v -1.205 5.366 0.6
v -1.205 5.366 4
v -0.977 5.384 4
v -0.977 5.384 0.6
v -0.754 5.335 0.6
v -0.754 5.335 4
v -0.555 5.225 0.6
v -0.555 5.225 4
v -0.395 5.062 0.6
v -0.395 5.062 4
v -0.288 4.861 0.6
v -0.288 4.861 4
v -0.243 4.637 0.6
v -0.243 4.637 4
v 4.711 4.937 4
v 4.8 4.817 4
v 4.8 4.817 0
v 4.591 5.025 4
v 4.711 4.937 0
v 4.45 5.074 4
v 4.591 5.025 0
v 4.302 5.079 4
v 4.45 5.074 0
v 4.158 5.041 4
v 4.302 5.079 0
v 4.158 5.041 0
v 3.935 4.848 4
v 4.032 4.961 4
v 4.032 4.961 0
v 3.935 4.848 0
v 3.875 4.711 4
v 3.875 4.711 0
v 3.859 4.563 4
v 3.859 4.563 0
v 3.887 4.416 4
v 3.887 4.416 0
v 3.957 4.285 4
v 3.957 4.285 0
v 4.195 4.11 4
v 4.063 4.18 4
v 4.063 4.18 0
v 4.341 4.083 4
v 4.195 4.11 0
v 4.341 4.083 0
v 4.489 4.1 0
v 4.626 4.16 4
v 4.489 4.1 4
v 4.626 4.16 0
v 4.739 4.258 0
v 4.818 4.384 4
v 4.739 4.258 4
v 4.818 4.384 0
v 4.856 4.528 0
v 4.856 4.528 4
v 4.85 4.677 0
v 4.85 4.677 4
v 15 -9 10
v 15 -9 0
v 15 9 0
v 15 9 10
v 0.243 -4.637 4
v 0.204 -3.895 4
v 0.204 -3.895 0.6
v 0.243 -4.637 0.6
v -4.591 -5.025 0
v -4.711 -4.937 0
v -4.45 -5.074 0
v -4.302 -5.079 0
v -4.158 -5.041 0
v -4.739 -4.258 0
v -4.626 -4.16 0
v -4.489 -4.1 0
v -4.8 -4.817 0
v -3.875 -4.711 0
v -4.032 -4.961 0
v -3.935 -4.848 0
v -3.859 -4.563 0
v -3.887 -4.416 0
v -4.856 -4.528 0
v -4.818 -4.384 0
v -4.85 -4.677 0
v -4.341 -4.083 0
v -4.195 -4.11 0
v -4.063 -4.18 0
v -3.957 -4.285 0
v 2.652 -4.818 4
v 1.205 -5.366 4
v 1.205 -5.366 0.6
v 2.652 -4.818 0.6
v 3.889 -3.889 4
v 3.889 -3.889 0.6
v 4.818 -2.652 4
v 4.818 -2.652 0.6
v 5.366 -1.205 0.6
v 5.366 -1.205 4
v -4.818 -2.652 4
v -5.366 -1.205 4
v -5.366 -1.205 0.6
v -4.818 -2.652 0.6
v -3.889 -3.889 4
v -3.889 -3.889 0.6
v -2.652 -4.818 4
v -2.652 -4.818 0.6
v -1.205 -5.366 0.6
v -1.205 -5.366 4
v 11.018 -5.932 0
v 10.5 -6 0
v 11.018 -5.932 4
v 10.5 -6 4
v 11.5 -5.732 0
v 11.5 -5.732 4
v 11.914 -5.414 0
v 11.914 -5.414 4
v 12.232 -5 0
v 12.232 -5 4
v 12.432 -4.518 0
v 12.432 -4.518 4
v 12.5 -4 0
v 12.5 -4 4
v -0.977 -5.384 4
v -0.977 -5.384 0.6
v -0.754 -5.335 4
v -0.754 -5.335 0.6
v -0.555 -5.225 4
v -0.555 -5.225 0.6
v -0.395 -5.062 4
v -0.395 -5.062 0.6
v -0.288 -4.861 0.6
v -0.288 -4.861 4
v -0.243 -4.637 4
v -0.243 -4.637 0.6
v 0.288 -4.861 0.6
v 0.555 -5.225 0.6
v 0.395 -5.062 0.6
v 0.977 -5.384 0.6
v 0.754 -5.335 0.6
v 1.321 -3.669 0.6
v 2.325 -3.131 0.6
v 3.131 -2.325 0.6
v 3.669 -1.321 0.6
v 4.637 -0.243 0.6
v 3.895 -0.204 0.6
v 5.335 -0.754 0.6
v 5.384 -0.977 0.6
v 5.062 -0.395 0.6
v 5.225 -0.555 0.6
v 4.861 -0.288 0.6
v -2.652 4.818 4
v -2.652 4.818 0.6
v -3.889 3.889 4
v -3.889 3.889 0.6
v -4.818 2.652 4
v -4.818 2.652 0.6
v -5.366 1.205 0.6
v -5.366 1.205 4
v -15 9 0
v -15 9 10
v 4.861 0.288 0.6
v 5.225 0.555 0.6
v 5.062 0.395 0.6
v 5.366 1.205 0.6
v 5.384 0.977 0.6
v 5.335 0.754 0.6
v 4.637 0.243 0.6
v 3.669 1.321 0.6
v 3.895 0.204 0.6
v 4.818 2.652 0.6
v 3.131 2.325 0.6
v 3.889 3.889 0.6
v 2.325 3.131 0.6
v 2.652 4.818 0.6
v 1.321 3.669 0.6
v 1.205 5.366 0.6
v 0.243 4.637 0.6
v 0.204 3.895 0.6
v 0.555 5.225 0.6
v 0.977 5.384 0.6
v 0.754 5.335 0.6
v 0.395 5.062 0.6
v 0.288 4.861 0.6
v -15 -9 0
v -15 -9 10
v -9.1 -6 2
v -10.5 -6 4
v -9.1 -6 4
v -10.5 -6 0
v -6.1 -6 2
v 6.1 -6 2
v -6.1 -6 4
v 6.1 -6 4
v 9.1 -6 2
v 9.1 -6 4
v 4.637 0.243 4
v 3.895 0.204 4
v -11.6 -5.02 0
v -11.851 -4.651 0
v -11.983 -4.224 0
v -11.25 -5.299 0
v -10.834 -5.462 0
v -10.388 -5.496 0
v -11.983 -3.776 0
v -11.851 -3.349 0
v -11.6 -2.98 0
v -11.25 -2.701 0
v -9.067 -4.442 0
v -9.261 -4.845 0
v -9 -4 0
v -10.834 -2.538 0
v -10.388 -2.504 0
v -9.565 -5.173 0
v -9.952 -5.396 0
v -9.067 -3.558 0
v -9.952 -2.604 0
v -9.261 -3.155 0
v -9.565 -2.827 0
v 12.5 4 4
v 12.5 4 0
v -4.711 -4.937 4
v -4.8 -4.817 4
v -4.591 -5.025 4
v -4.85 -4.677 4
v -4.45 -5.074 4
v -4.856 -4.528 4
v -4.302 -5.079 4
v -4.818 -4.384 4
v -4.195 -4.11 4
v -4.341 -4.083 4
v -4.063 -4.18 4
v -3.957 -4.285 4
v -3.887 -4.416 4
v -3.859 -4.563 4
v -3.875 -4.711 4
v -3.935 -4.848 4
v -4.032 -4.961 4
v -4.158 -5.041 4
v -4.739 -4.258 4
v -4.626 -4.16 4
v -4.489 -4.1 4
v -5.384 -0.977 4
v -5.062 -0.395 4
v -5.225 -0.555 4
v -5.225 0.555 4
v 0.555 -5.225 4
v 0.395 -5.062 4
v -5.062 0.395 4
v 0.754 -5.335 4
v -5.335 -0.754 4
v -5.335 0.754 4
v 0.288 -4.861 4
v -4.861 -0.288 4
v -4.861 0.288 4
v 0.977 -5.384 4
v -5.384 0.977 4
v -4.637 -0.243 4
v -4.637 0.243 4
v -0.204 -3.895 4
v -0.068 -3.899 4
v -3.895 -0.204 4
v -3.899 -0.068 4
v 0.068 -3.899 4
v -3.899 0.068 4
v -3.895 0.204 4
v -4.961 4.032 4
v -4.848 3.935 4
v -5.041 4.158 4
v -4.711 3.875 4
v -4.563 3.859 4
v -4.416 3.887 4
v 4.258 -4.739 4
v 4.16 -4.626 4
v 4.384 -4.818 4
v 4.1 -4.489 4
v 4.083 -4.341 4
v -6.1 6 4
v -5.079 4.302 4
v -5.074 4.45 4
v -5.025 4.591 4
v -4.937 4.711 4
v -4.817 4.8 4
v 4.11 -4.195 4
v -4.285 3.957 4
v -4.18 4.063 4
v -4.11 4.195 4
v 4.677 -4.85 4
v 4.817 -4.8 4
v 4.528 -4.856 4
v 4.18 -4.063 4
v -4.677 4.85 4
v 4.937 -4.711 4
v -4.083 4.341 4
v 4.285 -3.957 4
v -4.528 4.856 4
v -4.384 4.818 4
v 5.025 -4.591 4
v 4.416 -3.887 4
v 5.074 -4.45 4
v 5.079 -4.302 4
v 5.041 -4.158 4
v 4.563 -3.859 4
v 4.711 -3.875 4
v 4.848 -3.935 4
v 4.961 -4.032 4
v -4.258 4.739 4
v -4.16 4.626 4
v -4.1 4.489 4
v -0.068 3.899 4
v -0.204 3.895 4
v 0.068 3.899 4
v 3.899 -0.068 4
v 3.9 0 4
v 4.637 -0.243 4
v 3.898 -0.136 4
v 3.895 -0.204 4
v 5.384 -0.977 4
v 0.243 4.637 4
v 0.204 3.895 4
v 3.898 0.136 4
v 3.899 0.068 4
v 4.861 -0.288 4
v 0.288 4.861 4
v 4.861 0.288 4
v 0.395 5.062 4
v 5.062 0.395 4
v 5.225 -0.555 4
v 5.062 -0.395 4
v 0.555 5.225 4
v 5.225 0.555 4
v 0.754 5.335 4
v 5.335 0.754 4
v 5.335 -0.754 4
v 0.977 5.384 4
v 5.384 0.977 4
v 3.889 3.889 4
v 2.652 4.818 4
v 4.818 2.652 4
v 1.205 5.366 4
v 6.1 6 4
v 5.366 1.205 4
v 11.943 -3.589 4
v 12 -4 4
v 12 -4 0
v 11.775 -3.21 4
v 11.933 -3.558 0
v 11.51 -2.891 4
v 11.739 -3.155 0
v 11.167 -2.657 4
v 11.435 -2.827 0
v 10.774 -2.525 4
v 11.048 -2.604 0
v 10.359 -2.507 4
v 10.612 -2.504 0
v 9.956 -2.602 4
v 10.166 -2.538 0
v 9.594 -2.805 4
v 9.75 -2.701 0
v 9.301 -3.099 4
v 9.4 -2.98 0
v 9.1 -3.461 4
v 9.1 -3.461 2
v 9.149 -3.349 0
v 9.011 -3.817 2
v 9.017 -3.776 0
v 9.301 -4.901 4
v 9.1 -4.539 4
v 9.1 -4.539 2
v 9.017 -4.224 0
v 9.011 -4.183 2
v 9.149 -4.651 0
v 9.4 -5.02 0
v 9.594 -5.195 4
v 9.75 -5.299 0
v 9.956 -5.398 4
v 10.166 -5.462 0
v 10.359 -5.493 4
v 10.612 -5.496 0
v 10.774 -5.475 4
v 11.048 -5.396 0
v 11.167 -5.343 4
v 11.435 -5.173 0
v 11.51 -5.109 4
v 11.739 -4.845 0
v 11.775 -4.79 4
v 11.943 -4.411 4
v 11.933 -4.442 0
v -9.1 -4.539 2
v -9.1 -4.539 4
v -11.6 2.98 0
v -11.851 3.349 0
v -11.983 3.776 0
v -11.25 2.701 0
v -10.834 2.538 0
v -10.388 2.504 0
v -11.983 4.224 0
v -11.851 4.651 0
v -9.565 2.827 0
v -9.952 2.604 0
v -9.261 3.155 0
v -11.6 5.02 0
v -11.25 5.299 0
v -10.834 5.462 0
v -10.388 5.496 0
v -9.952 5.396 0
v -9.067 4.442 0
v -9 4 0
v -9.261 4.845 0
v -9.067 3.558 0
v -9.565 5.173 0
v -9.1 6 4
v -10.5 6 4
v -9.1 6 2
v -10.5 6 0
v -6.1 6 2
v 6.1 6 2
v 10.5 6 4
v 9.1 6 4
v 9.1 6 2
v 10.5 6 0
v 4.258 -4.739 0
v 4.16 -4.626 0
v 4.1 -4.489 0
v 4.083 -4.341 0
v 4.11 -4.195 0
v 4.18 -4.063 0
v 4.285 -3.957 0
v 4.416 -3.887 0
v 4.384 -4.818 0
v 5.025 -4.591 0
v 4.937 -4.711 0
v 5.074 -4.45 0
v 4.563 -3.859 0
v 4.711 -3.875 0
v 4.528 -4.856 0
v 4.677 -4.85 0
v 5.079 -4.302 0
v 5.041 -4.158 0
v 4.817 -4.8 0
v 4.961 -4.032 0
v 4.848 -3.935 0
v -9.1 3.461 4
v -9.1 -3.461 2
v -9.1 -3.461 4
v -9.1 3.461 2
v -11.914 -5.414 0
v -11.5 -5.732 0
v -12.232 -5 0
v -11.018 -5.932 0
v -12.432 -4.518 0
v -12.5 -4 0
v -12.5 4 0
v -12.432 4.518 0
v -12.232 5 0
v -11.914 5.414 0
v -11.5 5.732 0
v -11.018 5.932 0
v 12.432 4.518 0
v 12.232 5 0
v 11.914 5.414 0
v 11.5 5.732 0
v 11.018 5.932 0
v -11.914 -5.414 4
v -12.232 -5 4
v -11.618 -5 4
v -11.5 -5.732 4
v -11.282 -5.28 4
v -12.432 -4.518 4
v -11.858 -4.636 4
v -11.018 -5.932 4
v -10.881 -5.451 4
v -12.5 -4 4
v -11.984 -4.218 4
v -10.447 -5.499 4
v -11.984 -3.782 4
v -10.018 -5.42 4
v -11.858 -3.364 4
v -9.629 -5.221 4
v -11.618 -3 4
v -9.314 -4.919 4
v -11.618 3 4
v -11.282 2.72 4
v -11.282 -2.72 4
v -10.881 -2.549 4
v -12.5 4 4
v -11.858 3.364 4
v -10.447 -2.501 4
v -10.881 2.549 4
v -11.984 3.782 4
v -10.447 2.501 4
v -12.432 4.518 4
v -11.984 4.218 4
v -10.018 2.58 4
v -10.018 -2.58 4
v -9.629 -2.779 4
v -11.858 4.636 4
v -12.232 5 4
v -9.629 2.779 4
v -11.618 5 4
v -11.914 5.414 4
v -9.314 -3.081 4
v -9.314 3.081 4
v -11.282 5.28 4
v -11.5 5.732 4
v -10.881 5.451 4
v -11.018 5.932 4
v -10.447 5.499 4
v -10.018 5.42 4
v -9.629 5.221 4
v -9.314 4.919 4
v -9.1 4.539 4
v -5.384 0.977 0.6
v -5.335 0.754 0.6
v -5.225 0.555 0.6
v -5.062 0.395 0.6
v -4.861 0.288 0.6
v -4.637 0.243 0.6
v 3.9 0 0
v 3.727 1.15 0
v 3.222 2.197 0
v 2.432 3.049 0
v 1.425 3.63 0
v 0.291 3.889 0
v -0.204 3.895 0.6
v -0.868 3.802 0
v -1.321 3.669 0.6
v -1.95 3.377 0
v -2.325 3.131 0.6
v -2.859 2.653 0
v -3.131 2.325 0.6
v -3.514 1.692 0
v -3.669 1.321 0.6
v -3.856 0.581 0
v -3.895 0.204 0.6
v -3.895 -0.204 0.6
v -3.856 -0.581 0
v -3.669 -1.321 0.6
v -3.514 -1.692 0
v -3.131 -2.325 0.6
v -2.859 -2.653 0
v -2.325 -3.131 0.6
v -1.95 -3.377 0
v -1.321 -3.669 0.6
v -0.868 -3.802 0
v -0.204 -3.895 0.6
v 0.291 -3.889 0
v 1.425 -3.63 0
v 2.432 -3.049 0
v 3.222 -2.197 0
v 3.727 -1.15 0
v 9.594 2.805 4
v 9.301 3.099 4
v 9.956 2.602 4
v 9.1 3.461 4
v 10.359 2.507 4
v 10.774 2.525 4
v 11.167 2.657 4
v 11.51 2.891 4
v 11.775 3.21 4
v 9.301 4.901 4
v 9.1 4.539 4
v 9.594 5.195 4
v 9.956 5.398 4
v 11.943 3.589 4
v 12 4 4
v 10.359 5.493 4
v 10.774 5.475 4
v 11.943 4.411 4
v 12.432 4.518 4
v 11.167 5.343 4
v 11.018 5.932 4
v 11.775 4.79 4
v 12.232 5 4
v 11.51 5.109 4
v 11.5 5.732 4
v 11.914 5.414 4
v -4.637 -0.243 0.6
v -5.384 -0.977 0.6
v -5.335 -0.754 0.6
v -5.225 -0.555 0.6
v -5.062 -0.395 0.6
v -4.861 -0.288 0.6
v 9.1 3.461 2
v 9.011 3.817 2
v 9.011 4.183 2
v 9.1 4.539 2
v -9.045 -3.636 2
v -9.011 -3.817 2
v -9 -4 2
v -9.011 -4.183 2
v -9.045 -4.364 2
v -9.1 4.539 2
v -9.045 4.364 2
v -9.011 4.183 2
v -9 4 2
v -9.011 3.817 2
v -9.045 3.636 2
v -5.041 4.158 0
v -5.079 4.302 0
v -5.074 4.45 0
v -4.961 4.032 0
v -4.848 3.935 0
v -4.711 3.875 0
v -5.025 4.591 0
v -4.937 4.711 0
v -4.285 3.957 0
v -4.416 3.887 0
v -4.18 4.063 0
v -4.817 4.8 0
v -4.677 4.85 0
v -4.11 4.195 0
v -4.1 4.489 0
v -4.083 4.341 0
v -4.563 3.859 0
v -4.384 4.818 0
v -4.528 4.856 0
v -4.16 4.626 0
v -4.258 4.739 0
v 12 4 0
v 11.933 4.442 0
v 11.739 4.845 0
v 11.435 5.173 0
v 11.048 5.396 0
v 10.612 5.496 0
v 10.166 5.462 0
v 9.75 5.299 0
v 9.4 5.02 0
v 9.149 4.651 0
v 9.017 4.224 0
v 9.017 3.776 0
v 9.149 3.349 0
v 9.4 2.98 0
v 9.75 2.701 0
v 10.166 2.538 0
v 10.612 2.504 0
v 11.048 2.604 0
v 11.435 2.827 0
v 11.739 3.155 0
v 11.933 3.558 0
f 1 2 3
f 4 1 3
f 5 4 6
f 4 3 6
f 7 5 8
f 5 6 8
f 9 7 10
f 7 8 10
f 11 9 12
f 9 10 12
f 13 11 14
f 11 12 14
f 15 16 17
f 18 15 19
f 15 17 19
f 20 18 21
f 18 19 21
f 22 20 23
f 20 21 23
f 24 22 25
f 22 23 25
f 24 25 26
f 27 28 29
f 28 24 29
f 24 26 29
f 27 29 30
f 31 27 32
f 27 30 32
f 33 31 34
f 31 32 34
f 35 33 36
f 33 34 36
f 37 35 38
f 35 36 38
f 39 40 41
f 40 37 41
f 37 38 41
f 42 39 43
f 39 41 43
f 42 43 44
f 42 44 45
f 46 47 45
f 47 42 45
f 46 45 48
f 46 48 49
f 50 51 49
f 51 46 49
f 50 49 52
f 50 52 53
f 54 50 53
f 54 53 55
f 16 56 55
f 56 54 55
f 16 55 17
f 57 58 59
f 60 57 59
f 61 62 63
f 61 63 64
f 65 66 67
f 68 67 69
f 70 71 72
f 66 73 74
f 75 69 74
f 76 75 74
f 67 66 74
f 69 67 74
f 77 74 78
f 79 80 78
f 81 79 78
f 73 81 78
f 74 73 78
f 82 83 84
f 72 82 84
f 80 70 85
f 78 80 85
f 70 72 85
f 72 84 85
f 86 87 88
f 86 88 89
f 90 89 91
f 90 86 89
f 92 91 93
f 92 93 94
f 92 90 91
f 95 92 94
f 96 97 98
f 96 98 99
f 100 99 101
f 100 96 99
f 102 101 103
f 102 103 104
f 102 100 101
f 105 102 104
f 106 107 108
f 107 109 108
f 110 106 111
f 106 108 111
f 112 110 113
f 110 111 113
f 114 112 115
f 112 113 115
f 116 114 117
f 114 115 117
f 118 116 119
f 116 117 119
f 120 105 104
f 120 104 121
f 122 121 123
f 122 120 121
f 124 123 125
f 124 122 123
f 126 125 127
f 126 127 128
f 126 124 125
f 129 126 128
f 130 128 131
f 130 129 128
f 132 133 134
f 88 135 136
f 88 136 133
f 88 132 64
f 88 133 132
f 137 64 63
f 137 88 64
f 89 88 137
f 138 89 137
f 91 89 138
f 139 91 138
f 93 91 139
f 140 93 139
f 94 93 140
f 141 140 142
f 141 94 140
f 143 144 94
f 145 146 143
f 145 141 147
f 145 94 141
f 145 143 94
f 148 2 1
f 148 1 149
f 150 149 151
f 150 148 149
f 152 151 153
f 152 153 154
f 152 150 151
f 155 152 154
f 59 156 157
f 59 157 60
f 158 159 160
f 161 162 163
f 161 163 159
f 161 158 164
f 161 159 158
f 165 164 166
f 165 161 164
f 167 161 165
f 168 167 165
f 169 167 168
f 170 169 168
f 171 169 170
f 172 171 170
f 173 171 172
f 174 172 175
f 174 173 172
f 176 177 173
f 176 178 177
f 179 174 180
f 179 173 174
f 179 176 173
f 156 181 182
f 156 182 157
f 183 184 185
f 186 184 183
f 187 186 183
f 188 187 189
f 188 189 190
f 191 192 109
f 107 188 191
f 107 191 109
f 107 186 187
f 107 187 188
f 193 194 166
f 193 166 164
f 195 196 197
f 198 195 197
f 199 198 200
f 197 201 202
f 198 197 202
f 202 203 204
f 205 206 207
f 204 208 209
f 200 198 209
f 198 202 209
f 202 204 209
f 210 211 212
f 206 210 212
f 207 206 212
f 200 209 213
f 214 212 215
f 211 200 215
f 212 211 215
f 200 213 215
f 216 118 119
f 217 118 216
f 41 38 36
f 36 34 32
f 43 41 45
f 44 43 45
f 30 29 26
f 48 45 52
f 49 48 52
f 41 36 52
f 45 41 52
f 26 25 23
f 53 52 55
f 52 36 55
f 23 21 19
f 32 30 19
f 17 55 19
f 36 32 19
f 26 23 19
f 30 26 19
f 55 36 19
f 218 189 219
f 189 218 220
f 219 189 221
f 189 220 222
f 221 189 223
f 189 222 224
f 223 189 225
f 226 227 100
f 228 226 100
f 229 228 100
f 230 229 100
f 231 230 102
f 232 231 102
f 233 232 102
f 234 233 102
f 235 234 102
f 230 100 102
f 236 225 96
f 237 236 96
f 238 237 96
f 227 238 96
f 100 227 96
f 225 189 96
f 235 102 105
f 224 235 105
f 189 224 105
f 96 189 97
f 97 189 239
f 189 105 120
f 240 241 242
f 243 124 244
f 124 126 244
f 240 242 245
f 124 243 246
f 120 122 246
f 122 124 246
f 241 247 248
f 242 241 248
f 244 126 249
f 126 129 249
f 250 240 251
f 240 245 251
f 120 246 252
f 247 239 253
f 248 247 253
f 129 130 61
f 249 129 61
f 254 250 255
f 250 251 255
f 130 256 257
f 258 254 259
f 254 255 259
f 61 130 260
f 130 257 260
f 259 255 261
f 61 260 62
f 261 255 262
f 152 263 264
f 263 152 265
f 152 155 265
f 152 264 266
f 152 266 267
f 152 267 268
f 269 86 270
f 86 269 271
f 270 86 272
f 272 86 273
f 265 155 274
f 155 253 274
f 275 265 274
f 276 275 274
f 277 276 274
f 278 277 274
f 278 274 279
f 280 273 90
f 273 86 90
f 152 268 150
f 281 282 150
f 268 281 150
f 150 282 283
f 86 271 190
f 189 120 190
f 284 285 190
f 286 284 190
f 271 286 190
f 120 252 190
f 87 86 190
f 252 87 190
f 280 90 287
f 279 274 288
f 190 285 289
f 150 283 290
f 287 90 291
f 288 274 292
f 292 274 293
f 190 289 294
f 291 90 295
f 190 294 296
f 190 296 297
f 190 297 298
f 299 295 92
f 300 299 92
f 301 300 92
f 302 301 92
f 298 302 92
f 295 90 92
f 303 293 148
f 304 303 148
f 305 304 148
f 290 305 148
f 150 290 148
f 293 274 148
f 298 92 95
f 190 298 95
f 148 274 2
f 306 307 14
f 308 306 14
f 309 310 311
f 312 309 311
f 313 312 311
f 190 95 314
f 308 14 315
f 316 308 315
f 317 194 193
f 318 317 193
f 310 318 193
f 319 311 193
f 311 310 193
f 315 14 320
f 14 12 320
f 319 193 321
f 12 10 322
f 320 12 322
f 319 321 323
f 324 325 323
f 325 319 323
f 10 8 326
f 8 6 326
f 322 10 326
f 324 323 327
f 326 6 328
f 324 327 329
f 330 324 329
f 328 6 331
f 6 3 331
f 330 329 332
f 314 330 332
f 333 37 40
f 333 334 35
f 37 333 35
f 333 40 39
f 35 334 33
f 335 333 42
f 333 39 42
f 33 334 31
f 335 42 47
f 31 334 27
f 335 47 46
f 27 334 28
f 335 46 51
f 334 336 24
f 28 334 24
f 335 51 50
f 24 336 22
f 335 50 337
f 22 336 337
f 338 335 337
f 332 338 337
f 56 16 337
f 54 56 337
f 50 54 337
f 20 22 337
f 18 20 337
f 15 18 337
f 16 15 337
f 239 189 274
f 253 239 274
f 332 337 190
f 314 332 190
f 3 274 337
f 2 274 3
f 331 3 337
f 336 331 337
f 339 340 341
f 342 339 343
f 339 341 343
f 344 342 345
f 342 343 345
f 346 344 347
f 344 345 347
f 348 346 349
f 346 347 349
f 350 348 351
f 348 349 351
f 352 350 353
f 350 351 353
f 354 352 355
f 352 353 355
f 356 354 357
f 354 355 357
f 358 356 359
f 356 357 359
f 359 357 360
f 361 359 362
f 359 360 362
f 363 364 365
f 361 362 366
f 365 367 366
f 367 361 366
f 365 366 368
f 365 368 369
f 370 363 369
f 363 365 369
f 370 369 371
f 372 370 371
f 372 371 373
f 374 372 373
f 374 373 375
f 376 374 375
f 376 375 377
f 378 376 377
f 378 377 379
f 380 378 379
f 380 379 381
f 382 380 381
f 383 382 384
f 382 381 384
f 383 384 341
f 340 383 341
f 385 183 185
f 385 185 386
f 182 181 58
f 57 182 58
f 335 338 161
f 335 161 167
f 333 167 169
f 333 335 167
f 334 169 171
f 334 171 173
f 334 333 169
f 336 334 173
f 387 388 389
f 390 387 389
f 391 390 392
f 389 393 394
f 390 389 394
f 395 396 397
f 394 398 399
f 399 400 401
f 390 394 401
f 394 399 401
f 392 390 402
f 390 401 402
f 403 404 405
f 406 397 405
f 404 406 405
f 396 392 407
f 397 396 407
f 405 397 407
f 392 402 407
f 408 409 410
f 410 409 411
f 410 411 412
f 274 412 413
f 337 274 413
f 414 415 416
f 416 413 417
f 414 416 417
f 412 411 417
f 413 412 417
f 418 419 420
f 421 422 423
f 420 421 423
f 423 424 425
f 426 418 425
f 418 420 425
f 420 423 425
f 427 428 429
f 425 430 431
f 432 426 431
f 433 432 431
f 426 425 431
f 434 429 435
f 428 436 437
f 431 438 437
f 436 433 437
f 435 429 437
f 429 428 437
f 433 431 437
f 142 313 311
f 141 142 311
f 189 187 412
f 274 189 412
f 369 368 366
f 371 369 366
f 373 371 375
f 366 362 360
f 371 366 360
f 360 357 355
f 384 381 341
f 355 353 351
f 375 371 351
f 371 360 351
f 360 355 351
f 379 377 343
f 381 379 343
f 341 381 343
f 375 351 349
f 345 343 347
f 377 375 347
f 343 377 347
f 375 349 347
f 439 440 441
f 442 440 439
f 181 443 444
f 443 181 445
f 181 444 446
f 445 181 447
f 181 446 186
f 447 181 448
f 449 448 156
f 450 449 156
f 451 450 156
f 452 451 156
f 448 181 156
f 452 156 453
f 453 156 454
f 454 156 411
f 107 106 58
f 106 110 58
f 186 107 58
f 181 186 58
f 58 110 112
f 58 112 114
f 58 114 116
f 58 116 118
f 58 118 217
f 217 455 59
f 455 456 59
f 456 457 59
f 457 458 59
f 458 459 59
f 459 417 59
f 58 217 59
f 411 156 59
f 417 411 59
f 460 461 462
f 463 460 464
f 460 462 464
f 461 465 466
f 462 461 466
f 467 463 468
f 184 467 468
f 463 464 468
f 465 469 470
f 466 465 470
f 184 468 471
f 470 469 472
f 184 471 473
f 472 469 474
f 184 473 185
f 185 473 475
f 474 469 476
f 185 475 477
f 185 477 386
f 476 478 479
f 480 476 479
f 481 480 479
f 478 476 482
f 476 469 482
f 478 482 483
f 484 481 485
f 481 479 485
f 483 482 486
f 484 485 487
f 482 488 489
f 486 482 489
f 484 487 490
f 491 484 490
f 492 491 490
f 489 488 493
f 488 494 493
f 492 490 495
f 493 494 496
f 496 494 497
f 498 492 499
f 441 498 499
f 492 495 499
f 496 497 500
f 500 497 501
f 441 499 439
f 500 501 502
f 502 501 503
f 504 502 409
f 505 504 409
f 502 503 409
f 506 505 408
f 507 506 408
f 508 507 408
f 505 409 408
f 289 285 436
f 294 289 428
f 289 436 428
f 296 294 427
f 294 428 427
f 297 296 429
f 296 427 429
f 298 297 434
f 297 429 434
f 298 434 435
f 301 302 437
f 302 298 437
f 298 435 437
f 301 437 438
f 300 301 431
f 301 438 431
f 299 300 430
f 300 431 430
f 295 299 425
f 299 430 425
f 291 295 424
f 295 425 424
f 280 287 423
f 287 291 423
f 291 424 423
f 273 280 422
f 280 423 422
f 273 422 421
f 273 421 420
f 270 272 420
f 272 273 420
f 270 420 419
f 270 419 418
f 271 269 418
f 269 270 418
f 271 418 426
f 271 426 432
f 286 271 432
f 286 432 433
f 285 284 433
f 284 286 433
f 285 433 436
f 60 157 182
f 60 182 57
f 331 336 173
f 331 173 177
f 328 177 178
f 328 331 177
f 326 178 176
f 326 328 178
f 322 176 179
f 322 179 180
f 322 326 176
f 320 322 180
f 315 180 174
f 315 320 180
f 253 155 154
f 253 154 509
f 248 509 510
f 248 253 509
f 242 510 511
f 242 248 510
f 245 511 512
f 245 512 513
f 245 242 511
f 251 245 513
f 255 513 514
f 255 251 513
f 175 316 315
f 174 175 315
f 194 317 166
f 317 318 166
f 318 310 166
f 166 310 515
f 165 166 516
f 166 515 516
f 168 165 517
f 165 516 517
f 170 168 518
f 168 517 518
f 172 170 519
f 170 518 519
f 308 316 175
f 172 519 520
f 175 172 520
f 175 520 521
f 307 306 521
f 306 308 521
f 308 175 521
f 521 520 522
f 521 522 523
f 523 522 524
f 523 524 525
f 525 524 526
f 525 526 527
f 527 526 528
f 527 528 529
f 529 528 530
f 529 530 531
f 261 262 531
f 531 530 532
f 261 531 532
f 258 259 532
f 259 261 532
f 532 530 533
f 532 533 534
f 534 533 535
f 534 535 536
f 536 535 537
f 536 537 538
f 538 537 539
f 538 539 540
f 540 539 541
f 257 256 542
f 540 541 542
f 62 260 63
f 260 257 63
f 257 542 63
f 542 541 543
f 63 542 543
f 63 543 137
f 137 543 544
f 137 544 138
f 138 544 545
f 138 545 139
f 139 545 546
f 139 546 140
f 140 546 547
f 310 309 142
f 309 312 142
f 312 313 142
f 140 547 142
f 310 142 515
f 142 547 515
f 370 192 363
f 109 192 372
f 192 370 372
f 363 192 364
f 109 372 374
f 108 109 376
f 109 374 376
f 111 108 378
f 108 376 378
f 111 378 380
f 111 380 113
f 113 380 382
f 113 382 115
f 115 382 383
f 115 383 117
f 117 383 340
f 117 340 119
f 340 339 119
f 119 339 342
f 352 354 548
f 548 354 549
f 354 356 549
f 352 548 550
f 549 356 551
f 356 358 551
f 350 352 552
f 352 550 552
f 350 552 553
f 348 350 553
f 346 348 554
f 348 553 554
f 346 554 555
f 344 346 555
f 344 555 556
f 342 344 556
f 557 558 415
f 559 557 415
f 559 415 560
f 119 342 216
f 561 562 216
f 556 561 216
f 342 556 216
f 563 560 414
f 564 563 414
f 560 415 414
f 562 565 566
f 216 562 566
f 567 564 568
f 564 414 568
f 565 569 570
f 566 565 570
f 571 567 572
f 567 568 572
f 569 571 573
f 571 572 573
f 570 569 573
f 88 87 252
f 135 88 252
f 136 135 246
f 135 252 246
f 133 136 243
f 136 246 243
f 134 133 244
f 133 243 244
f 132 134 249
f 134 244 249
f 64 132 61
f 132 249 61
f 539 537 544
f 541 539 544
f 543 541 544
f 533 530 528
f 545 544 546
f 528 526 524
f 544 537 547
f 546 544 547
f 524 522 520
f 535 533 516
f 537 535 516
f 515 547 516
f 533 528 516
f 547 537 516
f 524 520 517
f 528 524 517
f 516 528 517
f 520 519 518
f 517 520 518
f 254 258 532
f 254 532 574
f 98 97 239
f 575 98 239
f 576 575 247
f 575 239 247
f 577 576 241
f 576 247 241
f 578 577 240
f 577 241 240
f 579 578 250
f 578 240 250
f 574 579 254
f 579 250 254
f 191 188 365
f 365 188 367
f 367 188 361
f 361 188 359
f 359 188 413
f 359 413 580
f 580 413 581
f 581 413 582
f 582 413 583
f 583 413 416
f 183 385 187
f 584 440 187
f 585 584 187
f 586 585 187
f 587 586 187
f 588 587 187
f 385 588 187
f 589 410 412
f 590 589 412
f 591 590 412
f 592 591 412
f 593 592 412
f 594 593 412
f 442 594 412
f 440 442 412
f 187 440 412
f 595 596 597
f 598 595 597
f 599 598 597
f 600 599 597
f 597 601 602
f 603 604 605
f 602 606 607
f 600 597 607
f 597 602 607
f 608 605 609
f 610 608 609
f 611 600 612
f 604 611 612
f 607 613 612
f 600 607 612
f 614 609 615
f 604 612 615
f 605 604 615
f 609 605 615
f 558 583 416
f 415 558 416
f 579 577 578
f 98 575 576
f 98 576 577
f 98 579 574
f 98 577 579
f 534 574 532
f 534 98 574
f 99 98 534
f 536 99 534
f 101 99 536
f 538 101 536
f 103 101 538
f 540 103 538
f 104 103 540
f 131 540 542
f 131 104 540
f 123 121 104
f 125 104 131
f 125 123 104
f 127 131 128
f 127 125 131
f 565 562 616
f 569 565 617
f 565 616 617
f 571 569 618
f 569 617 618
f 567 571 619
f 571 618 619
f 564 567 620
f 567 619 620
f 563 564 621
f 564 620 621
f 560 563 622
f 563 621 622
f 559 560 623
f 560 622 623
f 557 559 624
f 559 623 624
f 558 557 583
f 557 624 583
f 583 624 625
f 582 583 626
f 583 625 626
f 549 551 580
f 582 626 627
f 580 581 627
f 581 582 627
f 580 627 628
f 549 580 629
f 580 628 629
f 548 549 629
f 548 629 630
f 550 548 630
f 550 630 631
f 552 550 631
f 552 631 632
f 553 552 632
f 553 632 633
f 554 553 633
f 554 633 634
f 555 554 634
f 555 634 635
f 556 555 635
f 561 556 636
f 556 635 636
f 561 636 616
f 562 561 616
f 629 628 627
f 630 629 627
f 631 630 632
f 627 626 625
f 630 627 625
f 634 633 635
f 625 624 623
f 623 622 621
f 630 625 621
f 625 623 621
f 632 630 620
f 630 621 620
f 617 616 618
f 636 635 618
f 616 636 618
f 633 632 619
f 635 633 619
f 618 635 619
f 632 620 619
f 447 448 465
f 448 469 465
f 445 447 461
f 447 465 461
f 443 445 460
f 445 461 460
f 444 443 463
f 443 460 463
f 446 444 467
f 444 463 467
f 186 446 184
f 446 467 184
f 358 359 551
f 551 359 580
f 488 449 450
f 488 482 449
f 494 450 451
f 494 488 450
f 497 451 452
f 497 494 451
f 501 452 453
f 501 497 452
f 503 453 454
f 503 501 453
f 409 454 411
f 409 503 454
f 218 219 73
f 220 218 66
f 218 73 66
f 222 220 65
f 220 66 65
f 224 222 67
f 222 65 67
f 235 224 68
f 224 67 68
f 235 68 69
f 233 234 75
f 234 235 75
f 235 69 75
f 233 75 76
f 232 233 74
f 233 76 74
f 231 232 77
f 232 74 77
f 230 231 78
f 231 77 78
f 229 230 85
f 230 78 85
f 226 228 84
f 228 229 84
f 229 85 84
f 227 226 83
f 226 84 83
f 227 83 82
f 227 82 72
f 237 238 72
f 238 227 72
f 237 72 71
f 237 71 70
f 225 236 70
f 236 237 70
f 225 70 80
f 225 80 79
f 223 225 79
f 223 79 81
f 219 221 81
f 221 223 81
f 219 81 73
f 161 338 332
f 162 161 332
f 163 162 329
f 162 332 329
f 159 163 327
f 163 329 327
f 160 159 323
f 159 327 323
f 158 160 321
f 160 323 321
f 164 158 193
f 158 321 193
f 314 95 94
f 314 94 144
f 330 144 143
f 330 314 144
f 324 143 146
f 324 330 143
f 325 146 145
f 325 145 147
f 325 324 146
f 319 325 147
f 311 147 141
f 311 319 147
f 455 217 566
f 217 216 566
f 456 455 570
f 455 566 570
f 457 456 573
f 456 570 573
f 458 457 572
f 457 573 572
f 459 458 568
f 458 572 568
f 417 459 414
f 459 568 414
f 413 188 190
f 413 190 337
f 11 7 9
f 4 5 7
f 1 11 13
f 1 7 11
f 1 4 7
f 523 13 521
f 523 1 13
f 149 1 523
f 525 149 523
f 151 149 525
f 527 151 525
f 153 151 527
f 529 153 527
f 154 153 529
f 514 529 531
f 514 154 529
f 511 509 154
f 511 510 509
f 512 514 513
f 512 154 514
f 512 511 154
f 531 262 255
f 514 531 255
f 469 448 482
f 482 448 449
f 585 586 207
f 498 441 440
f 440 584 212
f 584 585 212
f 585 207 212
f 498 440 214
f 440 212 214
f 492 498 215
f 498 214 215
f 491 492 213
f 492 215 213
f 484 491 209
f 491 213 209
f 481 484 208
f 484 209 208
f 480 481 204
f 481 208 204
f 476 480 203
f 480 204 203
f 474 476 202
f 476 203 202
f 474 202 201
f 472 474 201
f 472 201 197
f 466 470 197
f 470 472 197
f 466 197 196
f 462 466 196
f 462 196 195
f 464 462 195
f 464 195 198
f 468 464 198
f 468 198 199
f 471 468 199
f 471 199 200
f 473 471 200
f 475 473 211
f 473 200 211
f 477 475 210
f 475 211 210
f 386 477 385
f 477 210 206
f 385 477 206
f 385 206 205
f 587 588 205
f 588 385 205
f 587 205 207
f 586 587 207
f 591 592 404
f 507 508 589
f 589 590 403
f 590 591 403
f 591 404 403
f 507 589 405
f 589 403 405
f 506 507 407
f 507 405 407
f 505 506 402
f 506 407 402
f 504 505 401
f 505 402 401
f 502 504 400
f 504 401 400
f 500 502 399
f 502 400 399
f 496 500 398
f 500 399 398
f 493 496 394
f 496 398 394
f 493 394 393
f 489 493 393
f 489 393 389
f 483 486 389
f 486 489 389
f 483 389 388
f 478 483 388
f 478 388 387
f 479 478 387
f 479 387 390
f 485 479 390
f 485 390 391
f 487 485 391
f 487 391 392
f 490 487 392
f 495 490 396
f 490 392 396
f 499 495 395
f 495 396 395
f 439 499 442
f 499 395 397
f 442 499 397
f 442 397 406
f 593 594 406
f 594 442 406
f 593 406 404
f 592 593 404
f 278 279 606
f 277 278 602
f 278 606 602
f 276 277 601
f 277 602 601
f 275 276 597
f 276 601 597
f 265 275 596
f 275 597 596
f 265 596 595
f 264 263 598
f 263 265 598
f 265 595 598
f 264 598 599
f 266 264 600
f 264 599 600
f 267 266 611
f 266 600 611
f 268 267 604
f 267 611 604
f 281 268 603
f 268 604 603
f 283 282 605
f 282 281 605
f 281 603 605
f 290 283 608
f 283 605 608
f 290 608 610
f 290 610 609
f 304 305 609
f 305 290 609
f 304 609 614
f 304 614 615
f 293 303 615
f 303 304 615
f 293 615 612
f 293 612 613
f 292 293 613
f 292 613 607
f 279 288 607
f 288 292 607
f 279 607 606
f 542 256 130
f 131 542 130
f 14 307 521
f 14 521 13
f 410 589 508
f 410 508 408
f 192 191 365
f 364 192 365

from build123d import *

# Parameters (mm, degrees)
CYLINDER045_W               = 5.5
CYLINDER045_H               = 4.8
CYLINDER045_ANGLE           = 84
CYLINDER045_PLACEMENT_ANGLE = 3
FILLET004_R                 = 0.79
ARRAY008_COUNT              = 4
CYLINDER049_R               = 3.9
CYLINDER049_DEPTH           = 10
CYLINDER048_R               = 1.5
CYLINDER048_DEPTH           = 10
ARRAY010_X_COUNT            = 2
ARRAY010_X_PITCH            = 21
ARRAY010_Y_COUNT            = 2
ARRAY010_Y_PITCH            = 8
BOX007_W                    = 3
BOX007_H                    = 12.9
BOX007_DEPTH                = 10
BOX006_W                    = 3
BOX006_H                    = 13.9
BOX006_DEPTH                = 10
CYLINDER061_R               = 0.5
CYLINDER061_DEPTH           = 10
ARRAY015_COUNT              = 4
ARRAY015_PLACEMENT_ANGLE    = 28
BOX004_W                    = 25
BOX004_H                    = 12
BOX004_DEPTH                = 4
FILLET006_R                 = 2
BOX009_W                    = 30
BOX009_H                    = 18
BOX009_DEPTH                = 10


with BuildPart() as array008:
    # Cylinder045 → Cylinder045 (revolve)
    with BuildSketch(Plane.XZ):
        with Locations((2.75, 2.4)):
            Rectangle(CYLINDER045_W, CYLINDER045_H)
    revolve(axis=Axis((0, 0, 0), (0, 0, 1)), revolution_arc=CYLINDER045_ANGLE)


with BuildPart() as array008_1:
    # Cylinder045 placement: moved
    add(array008.part.moved(Location((0, 0, 0.6))).rotate(Axis((0, 0, 0.6), (0, 0, 1)), CYLINDER045_PLACEMENT_ANGLE))

    # Fillet004
    fillet004_edges = [array008_1.edges().sort_by_distance(p)[0] for p in [
        (0.287848, 5.492462, 3),
        (5.492462, 0.287848, 3),
    ]]
    fillet(fillet004_edges, radius=FILLET004_R)

    # Array008: Array008 ×4 about axis
    array008_axis = Axis((0, 0, 0), (0, 0, 1))


with BuildPart() as array008_2:
    add(array008_1.part)
    for i in range(1, ARRAY008_COUNT):
        add(array008_1.part.rotate(array008_axis, i * 360 / ARRAY008_COUNT))


with BuildPart() as mountplateinnerhole003:
    # Cylinder049 → Cylinder049 (new body)
    with BuildSketch(Plane.XY):
        Circle(CYLINDER049_R)
    extrude(amount=CYLINDER049_DEPTH)


with BuildPart() as array010:
    # Cylinder048 → Cylinder048 (new body)
    with BuildSketch(Plane.XY):
        Circle(CYLINDER048_R)
    extrude(amount=CYLINDER048_DEPTH)

    # Array010 X: Array010 ×2


with BuildPart() as array010_1:
    add(array010.part)
    with Locations(*[(i * ARRAY010_X_PITCH, 0, 0) for i in range(1, ARRAY010_X_COUNT)]):
        add(array010.part)

    # Array010 Y: Array010 ×2


with BuildPart() as array010_2:
    add(array010_1.part)
    with Locations(*[(0, i * ARRAY010_Y_PITCH, 0) for i in range(1, ARRAY010_Y_COUNT)]):
        add(array010_1.part)


with BuildPart() as array010_3:
    # Array010 placement: moved
    add(array010_2.part.moved(Location((-10.5, -4, 0))))


with BuildPart() as cube007:
    # Box007 → Box007 (new body)
    with BuildSketch(Plane(origin=(-9.1, -6, 2), x_dir=(1, 0, 0), z_dir=(0, 0, 1))):
        with Locations((1.5, 6.45)):
            Rectangle(BOX007_W, BOX007_H)
    extrude(amount=BOX007_DEPTH)


with BuildPart() as cube006:
    # Box006 → Box006 (new body)
    with BuildSketch(Plane(origin=(6.1, -7, 2), x_dir=(1, 0, 0), z_dir=(0, 0, 1))):
        with Locations((1.5, 6.95)):
            Rectangle(BOX006_W, BOX006_H)
    extrude(amount=BOX006_DEPTH)


with BuildPart() as fusion019:
    # Cylinder061 → Cylinder061 (new body)
    with BuildSketch(Plane(origin=(6, 2, 0), x_dir=(1, 0, 0), z_dir=(0, 0, 1))):
        Circle(CYLINDER061_R)
    extrude(amount=CYLINDER061_DEPTH)

    # Array015: Fusion019 ×4 about axis
    array015_axis = Axis((0, 0, 0), (0, 0, 1))


with BuildPart() as fusion019_1:
    add(fusion019.part)
    for i in range(1, ARRAY015_COUNT):
        add(fusion019.part.rotate(array015_axis, i * 360 / ARRAY015_COUNT))


with BuildPart() as fusion019_2:
    # Array015 placement: moved
    add(fusion019_1.part.rotate(Axis((0, 0, 0), (0, 0, 1)), ARRAY015_PLACEMENT_ANGLE))

    # Fusion019: union Array008, MountPlateInnerHole003, Array010, Cube007, Cube006
    add(array008_2.part)
    add(mountplateinnerhole003.part)
    add(array010_3.part)
    add(cube007.part)
    add(cube006.part)


with BuildPart() as frontplate:
    # Box004 → Box004 (new body)
    with BuildSketch(Plane(origin=(-12.5, -6, 0), x_dir=(1, 0, 0), z_dir=(0, 0, 1))):
        with Locations((12.5, 6)):
            Rectangle(BOX004_W, BOX004_H)
    extrude(amount=BOX004_DEPTH)

    # Fillet006
    fillet006_edges = [frontplate.edges().sort_by_distance(p)[0] for p in [
        (-12.5, -6, 2),
        (-12.5, 6, 2),
        (12.5, -6, 2),
        (12.5, 6, 2),
    ]]
    fillet(fillet006_edges, radius=FILLET006_R)

    # Cut022: cut Fusion019
    add(fusion019_2.part, mode=Mode.SUBTRACT)


with BuildPart() as cut024:
    # Box009 → Box009 (new body)
    with BuildSketch(Plane(origin=(-15, -9, 0), x_dir=(1, 0, 0), z_dir=(0, 0, 1))):
        with Locations((15, 9)):
            Rectangle(BOX009_W, BOX009_H)
    extrude(amount=BOX009_DEPTH)

    # Cut024: cut FrontPlate
    add(frontplate.part, mode=Mode.SUBTRACT)


solid = cut024.part
